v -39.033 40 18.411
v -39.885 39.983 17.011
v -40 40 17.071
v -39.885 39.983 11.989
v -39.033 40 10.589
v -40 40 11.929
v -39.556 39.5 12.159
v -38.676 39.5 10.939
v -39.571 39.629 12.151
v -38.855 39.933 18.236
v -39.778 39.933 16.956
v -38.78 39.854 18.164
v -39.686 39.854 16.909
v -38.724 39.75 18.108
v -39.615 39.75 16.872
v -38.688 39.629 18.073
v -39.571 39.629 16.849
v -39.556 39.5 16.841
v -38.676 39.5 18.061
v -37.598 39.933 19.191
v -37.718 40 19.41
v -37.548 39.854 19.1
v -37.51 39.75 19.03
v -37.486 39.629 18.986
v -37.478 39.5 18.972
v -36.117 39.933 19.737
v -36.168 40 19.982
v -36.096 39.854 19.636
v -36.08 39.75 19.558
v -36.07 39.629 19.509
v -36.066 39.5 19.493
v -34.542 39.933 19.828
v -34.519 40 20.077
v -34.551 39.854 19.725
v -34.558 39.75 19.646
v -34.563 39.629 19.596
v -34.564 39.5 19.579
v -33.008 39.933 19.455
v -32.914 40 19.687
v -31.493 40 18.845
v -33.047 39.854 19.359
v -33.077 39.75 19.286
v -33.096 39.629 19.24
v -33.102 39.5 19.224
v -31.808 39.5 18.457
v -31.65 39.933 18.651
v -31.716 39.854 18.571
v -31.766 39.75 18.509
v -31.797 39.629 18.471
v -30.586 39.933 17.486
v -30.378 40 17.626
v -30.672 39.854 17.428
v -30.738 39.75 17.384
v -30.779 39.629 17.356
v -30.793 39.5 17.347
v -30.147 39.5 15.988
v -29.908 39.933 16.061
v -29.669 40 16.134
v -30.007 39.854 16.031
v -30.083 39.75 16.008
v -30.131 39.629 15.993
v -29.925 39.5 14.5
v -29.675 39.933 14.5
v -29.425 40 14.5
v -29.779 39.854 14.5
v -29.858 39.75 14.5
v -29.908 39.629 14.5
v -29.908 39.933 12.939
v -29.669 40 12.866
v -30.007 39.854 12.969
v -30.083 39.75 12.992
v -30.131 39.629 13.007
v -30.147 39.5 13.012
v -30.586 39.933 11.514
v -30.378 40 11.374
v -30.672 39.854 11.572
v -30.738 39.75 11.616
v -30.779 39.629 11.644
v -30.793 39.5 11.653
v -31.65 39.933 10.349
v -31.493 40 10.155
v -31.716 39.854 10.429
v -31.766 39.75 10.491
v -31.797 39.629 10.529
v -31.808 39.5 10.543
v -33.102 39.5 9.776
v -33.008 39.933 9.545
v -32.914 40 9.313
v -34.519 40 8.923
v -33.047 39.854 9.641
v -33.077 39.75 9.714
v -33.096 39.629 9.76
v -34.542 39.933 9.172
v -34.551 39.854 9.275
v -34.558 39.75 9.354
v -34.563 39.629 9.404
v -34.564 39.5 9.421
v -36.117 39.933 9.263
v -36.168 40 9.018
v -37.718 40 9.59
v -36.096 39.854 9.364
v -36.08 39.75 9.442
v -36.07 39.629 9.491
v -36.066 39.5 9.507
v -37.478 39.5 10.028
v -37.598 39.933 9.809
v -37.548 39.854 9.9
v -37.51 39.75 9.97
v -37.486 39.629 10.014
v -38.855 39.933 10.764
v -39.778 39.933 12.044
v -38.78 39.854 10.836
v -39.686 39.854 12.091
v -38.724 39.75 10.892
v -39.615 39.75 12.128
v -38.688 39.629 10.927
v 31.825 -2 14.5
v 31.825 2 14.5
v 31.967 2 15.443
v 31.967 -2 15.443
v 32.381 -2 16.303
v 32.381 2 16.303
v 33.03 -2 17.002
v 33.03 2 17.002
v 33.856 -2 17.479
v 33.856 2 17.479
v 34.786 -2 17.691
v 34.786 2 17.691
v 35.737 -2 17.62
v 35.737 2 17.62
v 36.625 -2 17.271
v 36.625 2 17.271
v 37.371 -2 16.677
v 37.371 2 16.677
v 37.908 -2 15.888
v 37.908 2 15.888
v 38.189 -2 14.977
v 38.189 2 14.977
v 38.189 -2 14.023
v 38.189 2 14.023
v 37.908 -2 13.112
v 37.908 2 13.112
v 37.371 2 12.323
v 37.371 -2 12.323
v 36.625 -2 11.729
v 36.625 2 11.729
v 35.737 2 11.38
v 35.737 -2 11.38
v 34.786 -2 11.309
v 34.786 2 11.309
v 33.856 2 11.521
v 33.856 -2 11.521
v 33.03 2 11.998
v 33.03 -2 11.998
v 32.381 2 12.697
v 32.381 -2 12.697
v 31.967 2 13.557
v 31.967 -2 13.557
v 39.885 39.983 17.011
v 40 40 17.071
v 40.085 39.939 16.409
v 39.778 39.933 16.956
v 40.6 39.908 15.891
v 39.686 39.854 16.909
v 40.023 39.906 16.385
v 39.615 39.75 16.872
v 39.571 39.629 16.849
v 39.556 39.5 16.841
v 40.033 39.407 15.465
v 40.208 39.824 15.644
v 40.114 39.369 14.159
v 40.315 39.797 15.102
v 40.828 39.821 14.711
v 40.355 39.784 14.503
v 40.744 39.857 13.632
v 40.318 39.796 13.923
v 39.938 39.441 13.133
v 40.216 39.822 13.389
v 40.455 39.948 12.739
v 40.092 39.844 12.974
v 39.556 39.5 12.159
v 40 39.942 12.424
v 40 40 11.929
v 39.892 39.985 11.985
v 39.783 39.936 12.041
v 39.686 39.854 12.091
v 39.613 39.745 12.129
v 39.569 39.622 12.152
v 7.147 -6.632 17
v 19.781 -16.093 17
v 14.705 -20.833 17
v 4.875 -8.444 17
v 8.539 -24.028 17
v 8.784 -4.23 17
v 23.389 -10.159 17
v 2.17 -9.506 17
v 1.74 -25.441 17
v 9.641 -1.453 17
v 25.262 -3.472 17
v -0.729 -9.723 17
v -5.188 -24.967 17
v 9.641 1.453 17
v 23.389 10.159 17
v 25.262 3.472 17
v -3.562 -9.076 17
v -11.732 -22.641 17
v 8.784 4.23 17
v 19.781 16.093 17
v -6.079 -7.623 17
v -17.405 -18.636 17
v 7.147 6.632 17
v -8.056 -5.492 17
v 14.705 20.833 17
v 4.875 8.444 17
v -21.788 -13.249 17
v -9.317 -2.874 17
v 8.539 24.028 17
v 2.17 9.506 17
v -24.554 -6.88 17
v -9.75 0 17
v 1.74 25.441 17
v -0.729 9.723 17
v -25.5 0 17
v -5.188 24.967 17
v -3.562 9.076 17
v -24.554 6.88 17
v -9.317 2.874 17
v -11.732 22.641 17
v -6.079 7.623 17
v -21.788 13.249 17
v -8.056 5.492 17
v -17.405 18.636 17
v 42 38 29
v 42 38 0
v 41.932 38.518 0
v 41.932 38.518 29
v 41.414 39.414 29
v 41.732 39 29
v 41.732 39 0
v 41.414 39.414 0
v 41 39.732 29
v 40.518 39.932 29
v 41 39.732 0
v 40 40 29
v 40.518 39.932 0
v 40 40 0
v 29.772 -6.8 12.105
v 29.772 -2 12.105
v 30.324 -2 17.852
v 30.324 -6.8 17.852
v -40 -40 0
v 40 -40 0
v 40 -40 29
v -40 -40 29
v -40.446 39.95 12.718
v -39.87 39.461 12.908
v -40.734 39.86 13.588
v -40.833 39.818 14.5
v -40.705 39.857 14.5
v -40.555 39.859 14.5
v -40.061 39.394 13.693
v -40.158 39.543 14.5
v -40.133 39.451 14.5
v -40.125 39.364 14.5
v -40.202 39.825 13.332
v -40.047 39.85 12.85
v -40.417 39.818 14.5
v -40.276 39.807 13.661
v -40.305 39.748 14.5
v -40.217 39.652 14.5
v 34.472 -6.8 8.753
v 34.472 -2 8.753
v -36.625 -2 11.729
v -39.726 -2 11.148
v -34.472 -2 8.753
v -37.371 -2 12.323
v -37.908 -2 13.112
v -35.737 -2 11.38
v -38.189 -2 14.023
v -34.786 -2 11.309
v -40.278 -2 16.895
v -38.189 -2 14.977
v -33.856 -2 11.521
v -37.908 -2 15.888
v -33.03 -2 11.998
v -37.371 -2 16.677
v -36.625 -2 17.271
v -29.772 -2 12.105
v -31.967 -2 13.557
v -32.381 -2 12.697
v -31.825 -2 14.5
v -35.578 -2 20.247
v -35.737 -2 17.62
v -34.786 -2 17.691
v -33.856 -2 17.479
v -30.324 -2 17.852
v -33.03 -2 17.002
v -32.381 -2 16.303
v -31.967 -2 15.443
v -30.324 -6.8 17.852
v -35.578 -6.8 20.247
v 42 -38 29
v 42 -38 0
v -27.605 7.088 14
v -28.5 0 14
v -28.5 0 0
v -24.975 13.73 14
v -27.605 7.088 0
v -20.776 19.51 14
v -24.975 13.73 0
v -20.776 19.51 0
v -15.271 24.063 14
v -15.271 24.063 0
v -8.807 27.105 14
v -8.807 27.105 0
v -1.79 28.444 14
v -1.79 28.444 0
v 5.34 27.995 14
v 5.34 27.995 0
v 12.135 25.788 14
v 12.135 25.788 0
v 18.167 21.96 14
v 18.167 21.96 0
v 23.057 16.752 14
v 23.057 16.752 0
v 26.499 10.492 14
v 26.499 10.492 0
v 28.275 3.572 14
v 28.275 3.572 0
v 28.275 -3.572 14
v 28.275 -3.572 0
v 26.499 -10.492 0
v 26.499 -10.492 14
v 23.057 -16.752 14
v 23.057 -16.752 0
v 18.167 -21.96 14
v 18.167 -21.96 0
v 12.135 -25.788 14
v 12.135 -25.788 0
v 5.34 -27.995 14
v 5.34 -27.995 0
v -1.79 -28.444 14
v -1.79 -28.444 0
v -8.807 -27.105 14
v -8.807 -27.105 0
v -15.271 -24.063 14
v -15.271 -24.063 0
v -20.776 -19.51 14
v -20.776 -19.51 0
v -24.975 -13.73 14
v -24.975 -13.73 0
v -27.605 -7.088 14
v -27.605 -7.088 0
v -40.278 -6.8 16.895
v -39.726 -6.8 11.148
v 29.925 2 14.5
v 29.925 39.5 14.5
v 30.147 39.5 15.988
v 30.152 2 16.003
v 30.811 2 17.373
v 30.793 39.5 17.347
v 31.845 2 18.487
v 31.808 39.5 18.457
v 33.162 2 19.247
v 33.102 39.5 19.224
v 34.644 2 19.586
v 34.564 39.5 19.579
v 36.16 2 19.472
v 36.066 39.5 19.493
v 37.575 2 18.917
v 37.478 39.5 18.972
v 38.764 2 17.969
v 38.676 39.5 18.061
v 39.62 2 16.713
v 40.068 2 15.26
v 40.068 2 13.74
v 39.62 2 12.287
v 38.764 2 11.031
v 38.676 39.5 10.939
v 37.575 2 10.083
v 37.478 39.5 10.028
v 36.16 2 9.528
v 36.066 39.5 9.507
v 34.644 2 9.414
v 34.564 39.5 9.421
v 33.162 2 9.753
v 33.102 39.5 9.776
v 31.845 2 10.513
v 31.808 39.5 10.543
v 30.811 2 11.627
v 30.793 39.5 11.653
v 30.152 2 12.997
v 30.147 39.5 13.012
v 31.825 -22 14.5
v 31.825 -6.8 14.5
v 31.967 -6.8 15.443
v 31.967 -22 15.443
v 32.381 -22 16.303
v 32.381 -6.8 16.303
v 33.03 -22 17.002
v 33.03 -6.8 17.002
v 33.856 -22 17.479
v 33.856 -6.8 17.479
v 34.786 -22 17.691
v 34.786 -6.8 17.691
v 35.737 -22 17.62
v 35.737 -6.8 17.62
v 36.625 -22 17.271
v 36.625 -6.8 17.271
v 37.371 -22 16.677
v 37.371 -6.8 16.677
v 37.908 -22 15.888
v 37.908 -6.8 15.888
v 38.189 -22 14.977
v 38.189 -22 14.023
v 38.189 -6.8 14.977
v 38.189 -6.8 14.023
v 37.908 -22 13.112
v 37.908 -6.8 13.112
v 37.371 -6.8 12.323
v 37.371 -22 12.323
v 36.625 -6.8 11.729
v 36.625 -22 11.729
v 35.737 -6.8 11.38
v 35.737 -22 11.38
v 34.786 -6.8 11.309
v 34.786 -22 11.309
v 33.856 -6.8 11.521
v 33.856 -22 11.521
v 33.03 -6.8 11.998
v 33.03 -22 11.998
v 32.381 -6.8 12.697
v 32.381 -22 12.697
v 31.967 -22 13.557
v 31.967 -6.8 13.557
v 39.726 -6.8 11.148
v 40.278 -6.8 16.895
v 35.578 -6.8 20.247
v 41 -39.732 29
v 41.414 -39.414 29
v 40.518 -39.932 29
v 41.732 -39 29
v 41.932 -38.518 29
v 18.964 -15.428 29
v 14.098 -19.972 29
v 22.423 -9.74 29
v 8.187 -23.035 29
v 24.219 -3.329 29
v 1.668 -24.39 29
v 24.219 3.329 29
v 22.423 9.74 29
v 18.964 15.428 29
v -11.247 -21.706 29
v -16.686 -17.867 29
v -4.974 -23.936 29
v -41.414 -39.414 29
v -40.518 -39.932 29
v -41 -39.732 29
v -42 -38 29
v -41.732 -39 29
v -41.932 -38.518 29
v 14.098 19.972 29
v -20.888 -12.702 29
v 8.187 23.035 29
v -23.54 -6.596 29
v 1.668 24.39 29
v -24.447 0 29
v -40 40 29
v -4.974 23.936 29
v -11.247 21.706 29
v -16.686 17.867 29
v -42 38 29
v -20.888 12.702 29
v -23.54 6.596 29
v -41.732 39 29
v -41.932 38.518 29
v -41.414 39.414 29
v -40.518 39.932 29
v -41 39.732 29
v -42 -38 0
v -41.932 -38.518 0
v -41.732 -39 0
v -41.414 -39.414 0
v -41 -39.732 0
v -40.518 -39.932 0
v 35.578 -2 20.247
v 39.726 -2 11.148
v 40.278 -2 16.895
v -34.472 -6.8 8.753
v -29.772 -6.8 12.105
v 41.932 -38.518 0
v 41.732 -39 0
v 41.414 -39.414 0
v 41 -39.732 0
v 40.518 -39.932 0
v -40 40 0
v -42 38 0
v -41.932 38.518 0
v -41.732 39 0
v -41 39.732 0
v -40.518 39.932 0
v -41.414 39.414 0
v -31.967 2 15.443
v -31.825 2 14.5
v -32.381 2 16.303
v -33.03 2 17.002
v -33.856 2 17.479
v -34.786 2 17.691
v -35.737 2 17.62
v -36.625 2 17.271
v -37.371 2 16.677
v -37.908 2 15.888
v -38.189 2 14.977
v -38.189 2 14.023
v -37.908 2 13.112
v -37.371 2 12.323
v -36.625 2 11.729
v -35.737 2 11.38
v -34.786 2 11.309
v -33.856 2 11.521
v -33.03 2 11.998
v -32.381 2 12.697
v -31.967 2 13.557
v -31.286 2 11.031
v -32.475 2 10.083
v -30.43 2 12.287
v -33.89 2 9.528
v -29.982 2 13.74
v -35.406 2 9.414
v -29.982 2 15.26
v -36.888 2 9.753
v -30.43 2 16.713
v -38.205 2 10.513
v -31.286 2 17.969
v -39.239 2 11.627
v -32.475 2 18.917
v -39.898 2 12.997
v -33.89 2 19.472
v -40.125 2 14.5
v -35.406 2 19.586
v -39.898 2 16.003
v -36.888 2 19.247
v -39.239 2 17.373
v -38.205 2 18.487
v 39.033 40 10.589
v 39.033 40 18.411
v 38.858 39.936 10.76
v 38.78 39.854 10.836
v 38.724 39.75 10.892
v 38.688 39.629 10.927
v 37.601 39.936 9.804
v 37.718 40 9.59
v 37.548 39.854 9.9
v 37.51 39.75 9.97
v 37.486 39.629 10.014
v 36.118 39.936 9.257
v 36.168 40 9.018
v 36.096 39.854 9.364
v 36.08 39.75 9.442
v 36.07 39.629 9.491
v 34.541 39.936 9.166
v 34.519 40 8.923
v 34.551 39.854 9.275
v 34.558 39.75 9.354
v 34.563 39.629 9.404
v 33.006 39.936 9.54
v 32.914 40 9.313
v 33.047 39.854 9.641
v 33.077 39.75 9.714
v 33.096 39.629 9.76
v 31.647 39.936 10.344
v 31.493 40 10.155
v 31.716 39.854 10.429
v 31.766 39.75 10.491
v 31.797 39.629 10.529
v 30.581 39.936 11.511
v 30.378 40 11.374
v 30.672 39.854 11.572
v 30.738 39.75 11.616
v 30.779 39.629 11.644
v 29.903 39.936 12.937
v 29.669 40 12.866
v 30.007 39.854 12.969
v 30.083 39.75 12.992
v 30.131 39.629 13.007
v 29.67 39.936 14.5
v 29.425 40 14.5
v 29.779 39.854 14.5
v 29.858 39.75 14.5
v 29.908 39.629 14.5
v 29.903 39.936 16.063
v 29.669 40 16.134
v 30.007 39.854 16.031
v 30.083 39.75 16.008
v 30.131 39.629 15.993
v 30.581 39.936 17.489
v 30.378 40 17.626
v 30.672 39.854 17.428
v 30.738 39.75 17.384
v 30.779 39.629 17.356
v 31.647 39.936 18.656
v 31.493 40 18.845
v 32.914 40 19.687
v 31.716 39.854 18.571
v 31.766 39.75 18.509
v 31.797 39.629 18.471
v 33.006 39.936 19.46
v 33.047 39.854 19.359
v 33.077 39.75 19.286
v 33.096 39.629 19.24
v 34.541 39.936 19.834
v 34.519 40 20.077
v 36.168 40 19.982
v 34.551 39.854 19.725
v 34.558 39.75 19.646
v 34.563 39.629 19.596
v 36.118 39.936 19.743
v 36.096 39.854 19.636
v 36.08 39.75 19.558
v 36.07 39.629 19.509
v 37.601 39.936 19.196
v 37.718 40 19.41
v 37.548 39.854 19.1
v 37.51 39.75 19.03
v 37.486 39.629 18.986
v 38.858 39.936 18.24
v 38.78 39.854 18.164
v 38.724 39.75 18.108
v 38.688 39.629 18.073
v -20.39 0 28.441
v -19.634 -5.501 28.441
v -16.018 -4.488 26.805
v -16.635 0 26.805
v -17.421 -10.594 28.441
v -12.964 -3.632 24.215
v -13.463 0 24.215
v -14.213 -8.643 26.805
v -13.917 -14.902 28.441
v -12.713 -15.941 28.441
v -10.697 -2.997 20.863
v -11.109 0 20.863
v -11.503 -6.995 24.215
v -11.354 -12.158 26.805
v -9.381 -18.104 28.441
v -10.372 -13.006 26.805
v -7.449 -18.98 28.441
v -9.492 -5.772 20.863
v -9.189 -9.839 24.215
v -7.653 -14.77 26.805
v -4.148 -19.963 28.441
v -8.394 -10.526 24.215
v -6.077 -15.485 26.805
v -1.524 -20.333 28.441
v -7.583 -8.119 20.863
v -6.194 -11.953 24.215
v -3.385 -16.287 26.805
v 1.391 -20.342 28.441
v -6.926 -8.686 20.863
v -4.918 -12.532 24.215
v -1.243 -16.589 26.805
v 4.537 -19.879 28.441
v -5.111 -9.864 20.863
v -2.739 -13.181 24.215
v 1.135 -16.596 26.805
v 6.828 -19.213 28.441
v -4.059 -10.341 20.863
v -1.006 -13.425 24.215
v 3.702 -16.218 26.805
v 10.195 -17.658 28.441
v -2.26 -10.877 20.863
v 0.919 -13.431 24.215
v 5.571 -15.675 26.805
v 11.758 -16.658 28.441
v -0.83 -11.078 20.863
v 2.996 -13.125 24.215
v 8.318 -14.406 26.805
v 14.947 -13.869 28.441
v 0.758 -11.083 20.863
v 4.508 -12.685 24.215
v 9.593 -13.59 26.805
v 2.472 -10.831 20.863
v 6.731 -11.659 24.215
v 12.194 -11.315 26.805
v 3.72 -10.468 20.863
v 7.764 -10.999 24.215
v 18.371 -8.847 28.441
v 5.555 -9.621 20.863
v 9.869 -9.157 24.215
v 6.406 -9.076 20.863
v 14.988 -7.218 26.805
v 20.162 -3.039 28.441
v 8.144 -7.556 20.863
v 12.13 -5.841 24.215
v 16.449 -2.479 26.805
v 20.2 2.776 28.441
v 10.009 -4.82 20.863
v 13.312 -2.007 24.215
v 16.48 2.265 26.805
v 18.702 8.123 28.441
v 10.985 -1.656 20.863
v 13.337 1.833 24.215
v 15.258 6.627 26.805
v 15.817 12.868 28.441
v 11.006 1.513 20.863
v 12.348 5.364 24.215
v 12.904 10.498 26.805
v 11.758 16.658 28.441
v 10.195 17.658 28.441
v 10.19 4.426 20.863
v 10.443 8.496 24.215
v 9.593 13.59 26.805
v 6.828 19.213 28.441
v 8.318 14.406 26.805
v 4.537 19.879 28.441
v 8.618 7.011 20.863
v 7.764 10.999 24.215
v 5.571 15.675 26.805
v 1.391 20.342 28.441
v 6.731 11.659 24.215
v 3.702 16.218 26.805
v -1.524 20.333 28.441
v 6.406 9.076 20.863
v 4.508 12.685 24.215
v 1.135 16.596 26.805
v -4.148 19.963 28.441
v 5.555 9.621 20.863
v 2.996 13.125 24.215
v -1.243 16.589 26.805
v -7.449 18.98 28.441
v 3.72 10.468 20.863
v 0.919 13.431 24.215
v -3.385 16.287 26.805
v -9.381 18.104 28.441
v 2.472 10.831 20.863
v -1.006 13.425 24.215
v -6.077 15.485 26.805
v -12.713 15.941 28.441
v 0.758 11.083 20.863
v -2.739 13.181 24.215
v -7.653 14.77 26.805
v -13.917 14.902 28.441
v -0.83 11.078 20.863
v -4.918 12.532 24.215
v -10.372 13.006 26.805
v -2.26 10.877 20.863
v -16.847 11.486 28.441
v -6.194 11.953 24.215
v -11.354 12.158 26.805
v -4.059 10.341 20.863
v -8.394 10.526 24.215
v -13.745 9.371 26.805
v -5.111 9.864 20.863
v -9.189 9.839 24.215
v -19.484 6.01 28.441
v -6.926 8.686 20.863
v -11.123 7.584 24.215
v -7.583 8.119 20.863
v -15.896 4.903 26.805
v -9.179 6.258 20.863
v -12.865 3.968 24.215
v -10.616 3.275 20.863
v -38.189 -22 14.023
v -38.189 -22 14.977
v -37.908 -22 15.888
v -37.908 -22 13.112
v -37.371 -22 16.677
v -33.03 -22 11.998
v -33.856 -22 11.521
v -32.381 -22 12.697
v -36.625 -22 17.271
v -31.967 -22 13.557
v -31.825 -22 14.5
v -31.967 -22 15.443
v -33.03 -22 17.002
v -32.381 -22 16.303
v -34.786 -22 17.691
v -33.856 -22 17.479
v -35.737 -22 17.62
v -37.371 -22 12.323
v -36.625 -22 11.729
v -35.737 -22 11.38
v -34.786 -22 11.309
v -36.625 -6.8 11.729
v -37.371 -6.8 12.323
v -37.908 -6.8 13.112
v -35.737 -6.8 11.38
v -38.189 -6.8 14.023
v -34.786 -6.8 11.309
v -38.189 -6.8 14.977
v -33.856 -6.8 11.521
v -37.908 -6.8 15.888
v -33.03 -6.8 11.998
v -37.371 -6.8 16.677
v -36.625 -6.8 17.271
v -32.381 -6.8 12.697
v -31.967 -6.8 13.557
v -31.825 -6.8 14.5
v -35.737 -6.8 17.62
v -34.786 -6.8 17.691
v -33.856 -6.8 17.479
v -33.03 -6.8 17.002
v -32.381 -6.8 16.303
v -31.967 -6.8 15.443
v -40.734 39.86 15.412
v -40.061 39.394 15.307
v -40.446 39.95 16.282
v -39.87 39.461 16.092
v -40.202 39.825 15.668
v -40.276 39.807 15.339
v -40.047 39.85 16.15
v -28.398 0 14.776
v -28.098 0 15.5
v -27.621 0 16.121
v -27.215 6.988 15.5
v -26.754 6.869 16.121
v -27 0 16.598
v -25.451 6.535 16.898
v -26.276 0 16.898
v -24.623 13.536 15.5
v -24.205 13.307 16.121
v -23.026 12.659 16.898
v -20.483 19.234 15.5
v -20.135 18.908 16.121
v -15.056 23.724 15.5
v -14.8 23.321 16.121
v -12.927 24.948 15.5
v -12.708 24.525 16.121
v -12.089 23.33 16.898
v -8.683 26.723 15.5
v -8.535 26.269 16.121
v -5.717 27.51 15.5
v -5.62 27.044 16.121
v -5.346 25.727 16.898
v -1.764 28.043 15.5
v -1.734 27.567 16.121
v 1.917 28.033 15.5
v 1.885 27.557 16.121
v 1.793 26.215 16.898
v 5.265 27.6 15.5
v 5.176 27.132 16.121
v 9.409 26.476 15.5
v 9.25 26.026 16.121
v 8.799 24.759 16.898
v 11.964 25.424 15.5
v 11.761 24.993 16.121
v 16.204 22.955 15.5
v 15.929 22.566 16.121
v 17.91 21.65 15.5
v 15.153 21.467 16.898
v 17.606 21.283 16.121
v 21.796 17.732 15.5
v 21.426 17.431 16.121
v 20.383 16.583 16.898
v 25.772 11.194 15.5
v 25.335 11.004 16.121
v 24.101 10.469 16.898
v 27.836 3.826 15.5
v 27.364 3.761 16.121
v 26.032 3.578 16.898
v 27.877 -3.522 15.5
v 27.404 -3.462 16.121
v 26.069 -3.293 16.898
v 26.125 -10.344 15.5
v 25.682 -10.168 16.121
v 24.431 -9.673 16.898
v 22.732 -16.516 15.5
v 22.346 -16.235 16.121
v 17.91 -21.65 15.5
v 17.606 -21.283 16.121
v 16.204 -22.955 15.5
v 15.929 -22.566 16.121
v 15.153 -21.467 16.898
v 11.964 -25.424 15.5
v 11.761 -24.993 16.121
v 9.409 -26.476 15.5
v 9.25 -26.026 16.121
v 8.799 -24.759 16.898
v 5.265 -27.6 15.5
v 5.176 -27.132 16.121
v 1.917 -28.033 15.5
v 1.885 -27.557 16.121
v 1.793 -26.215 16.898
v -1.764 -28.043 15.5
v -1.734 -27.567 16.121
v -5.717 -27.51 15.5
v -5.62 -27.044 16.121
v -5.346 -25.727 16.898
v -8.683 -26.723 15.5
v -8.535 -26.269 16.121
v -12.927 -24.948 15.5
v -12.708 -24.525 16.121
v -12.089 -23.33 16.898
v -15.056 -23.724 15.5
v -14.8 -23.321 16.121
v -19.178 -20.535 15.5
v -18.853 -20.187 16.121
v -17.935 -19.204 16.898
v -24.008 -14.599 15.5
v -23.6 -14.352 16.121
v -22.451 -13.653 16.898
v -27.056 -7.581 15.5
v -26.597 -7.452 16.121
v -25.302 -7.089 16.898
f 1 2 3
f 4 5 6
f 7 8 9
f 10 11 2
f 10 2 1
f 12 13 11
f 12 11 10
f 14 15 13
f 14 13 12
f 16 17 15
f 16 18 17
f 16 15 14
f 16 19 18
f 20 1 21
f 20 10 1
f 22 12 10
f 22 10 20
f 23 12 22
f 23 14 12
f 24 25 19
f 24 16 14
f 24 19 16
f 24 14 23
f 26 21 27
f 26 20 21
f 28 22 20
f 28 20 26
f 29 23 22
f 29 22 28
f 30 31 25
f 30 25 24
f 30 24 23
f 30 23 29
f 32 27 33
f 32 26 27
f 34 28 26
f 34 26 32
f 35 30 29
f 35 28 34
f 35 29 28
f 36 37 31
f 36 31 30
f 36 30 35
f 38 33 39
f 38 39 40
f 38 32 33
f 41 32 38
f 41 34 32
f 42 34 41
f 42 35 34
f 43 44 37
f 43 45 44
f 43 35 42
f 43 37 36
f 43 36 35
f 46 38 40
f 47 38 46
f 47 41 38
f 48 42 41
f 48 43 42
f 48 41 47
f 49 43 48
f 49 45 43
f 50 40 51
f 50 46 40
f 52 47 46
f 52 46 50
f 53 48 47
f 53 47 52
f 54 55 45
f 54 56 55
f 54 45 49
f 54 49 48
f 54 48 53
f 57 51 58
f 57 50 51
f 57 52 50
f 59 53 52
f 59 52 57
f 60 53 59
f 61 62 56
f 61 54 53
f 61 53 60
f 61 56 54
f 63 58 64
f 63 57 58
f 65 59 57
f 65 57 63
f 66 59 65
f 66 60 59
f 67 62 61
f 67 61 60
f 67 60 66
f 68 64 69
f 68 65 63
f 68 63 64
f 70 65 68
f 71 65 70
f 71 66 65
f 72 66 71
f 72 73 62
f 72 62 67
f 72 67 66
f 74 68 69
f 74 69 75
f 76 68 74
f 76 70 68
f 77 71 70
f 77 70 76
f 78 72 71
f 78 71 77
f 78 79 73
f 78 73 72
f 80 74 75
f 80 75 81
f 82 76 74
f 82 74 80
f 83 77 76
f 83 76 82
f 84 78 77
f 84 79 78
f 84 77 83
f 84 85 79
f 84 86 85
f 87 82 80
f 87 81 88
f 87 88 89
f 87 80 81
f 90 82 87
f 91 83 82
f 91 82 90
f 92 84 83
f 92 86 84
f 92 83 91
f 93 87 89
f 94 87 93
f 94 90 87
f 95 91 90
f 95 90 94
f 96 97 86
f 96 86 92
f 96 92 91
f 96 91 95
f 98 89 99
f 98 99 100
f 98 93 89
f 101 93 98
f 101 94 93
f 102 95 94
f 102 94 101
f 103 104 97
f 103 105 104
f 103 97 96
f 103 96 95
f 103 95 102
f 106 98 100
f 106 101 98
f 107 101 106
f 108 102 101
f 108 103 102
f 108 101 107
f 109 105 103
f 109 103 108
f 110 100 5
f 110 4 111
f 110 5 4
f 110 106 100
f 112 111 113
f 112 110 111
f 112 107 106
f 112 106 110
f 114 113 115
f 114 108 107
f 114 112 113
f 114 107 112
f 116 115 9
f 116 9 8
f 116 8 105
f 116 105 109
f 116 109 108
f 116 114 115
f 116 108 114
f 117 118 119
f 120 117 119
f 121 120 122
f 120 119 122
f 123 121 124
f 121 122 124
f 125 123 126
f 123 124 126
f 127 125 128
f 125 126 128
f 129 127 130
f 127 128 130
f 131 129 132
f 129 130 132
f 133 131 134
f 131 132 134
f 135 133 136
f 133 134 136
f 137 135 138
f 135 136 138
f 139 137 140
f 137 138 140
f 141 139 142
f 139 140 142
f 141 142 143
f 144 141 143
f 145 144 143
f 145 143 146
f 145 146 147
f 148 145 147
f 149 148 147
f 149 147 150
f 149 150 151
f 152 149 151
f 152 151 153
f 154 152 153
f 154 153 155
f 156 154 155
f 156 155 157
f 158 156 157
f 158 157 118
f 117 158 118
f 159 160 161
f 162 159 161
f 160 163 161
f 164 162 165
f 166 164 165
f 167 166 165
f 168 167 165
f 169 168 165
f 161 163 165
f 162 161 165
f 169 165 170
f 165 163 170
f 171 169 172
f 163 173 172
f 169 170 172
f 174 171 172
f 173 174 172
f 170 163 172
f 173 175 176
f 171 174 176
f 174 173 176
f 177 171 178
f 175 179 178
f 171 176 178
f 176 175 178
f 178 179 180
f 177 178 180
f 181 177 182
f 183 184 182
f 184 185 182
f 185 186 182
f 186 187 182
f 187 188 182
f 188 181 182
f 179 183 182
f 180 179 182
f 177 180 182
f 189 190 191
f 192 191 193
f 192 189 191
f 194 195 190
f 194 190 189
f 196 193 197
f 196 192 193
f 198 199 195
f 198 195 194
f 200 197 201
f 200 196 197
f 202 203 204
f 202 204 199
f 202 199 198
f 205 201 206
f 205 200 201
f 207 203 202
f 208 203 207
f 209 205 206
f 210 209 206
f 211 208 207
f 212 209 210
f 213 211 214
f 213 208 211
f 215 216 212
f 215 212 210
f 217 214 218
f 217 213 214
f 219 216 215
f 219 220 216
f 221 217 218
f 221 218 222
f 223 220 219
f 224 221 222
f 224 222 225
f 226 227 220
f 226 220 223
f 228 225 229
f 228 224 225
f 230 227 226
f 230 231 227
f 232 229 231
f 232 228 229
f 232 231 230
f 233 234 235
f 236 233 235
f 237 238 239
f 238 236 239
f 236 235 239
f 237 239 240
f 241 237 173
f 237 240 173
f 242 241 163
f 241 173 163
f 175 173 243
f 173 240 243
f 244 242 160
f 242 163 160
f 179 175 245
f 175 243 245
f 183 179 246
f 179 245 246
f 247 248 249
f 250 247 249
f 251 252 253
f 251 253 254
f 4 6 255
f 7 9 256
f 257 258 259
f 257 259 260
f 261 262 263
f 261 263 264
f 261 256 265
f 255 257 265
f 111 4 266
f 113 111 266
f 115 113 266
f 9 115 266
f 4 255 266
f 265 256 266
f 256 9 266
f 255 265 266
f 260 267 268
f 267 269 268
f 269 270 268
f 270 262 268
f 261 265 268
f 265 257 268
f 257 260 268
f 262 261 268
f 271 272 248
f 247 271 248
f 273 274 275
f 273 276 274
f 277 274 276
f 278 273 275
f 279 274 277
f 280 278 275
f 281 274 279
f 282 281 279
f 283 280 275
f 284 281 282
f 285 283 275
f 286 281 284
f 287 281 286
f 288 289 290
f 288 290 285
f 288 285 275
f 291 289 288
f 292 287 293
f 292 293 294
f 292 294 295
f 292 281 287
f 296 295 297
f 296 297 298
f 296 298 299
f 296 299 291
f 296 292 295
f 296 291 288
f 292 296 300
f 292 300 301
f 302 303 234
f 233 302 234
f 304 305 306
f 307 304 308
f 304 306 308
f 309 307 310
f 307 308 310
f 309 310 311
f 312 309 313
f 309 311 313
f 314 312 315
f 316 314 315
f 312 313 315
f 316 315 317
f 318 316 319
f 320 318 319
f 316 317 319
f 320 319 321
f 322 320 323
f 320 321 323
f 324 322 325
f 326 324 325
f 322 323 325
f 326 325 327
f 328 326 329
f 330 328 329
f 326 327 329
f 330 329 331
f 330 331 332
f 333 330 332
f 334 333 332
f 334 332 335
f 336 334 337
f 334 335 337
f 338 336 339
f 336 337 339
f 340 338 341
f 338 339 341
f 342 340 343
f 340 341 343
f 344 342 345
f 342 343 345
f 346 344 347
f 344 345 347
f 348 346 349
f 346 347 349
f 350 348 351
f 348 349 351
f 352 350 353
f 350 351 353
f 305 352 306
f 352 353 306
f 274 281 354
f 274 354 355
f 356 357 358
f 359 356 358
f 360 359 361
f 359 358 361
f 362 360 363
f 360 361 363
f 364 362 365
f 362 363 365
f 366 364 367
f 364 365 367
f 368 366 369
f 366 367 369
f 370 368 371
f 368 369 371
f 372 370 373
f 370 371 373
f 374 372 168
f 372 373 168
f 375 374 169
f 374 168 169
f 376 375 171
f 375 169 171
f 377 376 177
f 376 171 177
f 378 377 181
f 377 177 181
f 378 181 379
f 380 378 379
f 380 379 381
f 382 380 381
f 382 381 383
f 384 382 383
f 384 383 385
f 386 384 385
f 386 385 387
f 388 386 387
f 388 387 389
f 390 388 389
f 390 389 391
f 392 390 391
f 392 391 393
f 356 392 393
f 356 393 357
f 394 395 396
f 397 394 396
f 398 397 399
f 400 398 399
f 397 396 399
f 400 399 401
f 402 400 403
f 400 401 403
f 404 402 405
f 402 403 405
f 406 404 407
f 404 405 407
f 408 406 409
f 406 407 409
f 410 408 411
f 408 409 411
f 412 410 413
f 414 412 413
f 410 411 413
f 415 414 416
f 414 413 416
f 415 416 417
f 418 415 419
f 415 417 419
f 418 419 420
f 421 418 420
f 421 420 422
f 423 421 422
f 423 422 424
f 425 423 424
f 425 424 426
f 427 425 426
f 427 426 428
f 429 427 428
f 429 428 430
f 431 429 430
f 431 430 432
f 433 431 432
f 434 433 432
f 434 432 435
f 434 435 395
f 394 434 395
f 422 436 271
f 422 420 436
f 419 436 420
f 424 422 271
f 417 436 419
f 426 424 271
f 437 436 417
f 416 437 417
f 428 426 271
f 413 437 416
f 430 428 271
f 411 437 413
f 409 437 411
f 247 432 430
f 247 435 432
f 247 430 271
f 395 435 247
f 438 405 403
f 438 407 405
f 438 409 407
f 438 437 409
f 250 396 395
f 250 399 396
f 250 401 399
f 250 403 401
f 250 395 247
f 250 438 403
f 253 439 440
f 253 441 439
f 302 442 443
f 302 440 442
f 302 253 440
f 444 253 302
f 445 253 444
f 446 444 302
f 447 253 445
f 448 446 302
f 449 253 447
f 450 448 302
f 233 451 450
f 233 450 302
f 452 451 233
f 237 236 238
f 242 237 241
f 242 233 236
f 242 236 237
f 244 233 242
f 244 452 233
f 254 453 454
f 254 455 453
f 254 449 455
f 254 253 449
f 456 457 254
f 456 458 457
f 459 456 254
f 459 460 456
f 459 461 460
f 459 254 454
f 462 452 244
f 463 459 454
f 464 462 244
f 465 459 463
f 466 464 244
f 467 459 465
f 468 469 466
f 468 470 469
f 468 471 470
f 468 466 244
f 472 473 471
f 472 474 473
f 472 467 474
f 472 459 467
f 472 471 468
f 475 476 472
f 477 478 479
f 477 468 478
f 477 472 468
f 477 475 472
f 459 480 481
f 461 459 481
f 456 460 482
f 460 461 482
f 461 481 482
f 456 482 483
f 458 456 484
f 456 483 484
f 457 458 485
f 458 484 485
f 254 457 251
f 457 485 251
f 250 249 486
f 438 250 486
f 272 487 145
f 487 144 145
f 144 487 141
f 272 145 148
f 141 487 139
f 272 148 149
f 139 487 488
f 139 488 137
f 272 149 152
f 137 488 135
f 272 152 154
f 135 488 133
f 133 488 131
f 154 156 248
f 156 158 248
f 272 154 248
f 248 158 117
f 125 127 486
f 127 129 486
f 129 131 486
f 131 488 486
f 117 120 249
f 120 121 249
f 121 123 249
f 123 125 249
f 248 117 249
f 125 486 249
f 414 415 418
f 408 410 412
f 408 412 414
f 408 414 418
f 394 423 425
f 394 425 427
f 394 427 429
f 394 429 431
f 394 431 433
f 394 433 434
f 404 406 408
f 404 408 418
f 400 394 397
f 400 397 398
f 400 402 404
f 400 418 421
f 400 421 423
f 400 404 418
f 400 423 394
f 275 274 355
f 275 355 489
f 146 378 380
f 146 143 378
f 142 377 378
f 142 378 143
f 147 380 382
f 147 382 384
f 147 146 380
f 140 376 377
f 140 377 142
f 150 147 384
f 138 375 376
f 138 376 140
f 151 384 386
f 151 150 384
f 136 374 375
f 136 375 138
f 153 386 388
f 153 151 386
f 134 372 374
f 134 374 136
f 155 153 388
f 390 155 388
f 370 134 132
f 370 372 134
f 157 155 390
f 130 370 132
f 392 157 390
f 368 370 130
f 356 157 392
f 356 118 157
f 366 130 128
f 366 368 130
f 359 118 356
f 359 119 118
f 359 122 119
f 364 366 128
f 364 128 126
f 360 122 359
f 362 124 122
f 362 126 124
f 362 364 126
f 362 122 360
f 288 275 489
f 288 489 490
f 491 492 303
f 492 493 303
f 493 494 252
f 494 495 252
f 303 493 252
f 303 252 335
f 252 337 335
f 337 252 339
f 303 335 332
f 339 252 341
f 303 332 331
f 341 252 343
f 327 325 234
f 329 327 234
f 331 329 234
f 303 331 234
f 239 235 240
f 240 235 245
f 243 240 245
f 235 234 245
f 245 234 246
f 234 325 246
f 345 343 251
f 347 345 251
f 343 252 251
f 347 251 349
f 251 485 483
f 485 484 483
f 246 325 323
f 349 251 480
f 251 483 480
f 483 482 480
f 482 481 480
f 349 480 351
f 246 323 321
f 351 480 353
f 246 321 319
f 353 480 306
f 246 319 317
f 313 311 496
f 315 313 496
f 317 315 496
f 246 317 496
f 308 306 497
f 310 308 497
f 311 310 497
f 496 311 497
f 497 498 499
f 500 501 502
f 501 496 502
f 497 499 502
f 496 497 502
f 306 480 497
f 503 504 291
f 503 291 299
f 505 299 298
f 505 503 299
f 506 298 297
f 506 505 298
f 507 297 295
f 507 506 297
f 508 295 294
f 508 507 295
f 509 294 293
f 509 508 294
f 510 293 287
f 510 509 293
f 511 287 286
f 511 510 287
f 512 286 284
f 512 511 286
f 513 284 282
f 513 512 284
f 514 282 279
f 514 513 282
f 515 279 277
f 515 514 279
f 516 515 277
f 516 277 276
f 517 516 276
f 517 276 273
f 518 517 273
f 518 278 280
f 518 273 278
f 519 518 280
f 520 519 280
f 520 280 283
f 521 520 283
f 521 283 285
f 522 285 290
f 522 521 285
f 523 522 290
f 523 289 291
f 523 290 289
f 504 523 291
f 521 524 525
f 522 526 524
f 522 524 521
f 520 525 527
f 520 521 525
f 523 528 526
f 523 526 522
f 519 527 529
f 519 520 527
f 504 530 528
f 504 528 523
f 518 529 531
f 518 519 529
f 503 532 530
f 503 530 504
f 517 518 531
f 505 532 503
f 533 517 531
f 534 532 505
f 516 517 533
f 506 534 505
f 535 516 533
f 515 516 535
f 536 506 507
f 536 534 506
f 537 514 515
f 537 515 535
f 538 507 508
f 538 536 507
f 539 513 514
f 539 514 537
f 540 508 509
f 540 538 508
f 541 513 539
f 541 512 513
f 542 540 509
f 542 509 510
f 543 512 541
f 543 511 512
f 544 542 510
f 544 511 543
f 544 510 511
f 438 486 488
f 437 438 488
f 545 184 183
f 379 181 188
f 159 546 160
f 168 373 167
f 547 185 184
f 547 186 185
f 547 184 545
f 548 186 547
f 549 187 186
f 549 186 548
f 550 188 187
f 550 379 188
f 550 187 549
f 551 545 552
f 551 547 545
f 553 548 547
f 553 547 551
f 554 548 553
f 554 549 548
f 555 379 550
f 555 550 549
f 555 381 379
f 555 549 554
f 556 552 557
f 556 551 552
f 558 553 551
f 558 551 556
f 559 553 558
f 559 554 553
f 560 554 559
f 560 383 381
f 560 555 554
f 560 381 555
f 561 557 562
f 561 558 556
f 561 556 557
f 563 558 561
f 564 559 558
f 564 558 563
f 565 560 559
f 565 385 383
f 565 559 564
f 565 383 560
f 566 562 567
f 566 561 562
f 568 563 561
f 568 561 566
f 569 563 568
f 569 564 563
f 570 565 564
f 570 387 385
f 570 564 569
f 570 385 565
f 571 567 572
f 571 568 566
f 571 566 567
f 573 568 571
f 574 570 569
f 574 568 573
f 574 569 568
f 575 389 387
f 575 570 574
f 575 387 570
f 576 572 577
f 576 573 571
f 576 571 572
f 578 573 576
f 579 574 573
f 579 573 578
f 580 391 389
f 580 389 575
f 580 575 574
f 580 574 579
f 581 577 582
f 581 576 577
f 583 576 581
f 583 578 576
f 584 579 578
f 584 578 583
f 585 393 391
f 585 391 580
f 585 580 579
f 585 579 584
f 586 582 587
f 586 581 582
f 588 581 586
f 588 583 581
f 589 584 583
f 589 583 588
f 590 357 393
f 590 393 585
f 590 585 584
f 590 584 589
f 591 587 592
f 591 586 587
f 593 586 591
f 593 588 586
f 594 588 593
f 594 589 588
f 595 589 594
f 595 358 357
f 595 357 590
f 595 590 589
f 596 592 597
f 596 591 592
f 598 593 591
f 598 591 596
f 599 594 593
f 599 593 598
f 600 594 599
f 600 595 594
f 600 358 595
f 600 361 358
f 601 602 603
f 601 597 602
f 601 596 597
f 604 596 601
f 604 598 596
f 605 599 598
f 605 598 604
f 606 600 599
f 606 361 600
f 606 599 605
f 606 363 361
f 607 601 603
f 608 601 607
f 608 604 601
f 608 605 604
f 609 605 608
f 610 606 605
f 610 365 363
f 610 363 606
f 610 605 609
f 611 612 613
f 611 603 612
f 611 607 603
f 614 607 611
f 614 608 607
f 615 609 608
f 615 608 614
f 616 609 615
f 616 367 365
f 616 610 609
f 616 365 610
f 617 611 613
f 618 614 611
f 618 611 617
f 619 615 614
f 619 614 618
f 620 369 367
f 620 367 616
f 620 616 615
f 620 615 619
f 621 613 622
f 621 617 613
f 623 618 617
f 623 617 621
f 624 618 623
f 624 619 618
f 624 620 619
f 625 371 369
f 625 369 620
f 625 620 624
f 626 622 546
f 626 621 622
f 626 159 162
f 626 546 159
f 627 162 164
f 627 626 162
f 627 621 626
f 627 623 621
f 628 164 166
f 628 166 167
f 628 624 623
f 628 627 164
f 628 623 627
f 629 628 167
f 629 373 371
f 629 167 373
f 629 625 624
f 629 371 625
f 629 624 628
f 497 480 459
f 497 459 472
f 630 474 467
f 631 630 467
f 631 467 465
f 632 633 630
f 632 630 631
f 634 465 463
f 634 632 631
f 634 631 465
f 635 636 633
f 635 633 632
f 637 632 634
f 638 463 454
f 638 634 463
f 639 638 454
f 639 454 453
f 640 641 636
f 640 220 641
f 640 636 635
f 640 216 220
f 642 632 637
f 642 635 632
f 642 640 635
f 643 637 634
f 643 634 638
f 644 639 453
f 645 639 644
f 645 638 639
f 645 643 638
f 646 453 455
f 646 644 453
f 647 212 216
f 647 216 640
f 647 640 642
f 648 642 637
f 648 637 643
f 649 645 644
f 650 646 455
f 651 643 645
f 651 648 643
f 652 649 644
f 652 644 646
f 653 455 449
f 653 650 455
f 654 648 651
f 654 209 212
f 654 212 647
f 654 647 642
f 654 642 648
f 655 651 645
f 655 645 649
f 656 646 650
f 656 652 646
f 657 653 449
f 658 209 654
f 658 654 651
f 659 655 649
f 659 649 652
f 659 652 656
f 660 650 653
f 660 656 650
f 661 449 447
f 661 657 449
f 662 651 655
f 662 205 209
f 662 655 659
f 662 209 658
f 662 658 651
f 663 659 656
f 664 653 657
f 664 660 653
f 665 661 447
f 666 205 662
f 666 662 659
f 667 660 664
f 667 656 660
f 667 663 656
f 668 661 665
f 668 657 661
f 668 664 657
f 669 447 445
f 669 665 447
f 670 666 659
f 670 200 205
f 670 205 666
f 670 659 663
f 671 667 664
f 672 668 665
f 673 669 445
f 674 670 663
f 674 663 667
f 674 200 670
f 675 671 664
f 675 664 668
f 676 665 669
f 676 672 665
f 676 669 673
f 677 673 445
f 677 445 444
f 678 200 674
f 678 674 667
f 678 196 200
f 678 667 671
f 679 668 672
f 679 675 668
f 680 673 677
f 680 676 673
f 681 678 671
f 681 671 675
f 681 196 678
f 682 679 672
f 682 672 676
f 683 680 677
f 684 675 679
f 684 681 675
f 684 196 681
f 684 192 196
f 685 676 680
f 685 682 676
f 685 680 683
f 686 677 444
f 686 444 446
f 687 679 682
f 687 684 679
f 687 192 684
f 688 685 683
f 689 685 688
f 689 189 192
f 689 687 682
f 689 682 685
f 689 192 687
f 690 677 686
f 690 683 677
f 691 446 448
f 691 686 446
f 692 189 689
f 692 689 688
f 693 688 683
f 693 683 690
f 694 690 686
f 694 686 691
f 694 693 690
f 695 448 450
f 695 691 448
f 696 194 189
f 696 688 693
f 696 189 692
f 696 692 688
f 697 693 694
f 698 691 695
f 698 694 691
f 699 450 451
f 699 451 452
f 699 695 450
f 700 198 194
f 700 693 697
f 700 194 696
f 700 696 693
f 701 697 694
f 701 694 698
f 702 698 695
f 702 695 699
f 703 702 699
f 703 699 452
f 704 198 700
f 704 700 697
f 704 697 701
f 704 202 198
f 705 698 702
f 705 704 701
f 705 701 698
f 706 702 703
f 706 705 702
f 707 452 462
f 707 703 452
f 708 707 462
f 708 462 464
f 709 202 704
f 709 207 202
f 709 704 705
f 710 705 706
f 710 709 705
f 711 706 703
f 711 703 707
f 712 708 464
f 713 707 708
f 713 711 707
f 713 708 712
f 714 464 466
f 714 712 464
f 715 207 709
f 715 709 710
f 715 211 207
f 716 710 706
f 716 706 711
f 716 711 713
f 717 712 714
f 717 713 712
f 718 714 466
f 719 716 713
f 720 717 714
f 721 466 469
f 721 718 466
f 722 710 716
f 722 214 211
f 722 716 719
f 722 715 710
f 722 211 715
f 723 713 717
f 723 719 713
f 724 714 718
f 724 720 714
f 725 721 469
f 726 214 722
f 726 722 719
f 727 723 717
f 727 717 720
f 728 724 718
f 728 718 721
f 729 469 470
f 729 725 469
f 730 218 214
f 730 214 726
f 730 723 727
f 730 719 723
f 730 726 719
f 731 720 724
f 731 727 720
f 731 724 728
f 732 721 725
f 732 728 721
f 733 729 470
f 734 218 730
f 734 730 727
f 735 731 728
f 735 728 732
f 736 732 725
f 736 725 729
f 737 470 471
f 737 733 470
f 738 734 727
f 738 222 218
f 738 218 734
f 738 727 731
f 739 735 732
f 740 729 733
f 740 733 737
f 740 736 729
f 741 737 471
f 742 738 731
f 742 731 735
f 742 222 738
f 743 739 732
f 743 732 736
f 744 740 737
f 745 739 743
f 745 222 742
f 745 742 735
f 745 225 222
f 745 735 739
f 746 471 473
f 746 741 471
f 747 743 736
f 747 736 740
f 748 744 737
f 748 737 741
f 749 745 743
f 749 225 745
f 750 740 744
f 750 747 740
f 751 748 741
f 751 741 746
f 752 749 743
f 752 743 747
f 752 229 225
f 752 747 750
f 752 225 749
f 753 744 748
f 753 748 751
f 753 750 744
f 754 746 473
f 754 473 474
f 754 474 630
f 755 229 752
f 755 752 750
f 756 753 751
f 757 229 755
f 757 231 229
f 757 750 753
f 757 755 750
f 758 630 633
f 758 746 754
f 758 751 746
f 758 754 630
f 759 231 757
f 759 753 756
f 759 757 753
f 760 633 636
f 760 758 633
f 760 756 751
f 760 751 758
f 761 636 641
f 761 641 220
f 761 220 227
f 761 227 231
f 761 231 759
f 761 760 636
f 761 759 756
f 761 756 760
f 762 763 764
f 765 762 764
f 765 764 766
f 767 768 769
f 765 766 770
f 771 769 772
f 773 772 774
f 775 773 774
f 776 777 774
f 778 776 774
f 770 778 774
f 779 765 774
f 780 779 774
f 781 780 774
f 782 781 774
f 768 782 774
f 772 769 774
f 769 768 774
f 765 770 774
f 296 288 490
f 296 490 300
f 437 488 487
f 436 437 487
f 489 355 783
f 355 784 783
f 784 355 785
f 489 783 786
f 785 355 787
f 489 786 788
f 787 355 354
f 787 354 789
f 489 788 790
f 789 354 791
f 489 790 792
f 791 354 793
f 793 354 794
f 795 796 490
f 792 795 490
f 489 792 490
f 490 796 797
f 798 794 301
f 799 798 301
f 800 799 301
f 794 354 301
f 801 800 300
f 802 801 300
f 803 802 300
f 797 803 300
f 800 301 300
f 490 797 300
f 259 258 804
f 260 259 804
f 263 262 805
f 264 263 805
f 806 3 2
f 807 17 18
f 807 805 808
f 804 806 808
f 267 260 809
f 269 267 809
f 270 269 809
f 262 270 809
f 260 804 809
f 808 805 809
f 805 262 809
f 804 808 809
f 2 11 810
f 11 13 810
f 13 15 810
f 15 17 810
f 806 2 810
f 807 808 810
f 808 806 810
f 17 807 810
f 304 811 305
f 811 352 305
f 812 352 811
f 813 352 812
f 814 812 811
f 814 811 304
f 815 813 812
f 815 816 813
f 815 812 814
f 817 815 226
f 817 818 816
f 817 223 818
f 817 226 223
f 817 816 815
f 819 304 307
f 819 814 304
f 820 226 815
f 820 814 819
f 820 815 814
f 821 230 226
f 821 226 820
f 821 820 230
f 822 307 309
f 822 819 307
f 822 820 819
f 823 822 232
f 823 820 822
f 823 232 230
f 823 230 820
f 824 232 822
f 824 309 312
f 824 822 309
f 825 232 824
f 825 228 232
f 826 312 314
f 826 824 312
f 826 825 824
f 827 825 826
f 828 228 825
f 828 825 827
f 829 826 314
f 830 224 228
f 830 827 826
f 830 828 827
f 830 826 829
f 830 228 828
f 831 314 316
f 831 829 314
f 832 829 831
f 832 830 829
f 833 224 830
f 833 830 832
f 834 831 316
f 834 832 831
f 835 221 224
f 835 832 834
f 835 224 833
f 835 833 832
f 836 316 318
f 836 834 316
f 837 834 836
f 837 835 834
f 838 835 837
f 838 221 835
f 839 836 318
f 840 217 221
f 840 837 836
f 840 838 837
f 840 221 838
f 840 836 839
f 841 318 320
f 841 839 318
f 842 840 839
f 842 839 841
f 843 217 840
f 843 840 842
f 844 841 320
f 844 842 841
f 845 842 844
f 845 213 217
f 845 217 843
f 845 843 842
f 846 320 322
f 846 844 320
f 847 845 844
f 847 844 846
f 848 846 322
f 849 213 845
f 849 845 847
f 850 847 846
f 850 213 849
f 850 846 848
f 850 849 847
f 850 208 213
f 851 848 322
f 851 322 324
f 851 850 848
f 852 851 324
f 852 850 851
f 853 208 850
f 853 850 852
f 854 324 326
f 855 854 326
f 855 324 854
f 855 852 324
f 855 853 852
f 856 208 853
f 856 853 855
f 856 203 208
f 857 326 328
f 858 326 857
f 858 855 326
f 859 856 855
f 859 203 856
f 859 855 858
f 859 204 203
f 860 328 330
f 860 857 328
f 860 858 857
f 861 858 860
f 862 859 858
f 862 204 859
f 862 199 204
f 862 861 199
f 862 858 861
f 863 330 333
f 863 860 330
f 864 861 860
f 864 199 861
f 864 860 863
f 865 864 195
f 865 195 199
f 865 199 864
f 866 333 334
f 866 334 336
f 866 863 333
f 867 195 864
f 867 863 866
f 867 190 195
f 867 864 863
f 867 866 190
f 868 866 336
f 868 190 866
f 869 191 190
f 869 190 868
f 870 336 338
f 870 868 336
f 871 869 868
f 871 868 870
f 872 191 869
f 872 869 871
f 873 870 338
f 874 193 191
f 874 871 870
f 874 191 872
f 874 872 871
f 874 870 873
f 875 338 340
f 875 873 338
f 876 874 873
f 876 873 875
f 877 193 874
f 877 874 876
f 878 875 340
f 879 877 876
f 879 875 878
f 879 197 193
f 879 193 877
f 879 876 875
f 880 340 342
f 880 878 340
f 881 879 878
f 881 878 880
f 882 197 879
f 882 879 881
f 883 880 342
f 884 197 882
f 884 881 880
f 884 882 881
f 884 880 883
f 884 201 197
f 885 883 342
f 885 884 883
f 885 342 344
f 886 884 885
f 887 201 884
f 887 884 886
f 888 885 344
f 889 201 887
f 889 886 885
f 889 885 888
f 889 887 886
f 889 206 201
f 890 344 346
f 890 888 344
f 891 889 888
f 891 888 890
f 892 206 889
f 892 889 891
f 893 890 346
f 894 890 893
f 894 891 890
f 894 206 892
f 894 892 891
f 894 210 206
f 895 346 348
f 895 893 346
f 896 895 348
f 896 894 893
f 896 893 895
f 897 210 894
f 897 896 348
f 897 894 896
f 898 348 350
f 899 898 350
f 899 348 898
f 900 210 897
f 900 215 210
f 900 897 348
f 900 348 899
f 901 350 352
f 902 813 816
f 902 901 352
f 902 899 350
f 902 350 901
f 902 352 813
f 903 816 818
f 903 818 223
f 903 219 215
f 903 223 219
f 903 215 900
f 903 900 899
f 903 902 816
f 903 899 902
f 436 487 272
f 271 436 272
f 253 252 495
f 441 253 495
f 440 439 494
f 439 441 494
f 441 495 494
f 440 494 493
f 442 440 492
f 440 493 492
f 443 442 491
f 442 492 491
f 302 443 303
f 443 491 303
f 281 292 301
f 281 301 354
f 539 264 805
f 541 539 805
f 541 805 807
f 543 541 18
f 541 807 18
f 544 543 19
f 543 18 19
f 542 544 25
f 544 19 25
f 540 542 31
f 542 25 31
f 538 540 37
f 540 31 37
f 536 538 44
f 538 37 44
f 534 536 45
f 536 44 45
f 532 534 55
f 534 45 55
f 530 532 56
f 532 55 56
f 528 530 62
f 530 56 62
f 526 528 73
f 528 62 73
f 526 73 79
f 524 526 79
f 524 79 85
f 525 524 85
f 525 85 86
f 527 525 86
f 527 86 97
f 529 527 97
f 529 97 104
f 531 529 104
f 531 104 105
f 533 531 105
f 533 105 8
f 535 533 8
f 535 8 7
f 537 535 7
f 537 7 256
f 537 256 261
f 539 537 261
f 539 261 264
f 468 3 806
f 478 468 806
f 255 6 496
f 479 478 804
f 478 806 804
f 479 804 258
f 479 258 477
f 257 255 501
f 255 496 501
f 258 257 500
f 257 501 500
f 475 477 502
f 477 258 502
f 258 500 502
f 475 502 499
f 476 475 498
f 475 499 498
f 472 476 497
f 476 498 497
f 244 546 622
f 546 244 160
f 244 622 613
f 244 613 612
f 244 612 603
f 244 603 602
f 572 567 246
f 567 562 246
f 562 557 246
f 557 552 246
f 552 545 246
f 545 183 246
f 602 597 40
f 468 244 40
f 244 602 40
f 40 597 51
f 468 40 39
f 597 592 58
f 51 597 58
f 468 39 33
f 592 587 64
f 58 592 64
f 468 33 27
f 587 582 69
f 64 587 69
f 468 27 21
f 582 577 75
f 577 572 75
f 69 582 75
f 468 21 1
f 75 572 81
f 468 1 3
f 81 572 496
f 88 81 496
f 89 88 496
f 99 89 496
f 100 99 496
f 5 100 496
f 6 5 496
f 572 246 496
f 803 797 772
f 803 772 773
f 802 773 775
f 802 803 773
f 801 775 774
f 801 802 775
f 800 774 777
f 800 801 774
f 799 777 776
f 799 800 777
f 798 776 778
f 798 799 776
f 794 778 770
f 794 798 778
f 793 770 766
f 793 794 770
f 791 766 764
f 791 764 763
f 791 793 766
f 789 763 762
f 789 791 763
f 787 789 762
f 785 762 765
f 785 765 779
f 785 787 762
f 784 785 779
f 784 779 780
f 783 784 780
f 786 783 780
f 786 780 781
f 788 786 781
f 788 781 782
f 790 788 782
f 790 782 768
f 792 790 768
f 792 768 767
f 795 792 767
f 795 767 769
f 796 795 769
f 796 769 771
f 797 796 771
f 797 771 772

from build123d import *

# Parameters (mm, degrees)
SKETCH1_W          = 80
SKETCH1_H          = 84
SKETCH1_R          = 9.75
MAIN_BOSS_DEPTH    = 29
SKETCH2_R          = 28.5
CUT_EXTRUDE1_DEPTH = 17
FILLET1_R          = 15
SKETCH3_R          = 5.1
SCREW_HEAD_DEPTH   = 38
NUT_START          = -42
NUT_SLOT_DEPTH     = 4.8
SKETCH5_R          = 3.2
THROUGH_HOLE_DEPTH = 62
FILLET2_R          = 3
FILLET3_R          = 2
FILLET4_R          = 0.5


with BuildPart() as part:
    # Sketch1 → Main Boss (new body)
    with BuildSketch(Plane(origin=(0, 0, 0), x_dir=(0, 1, 0), z_dir=(0, 0, 1))):
        Rectangle(SKETCH1_W, SKETCH1_H)
        with Locations(Location((0, 0, 0), (0, 0, 90))):
            Circle(SKETCH1_R, mode=Mode.SUBTRACT)
    extrude(amount=MAIN_BOSS_DEPTH)

    # Sketch2 → Cut-Extrude1 (cut)
    with BuildSketch(Plane(origin=(0, 0, 0), x_dir=(1, 0, 0), z_dir=(0, 0, -1))):
        with Locations(Location((0, 0, 0), (0, 0, 180))):
            Circle(SKETCH2_R)
    extrude(amount=-CUT_EXTRUDE1_DEPTH, mode=Mode.SUBTRACT)

    # Fillet1
    # the kernel refuses this fillet: 15 mm, written as the material it takes off along each edge
    with BuildSketch(Plane(origin=(0, 0, 29), x_dir=(-1, 0, 0), z_dir=(0, 1, 0))) as fillet1_piece_1:
        with BuildLine():
            CenterArc((24.446938457, -15), FILLET1_R, 90, 78.463040967)
            Line((9.75, -12), (9.456061231, -11.94))
            ThreePointArc((9.456061231, -11.94), (9.45, -6), (9.45, 0))
            Line((9.45, 0), (9.75, 0.3))
            Line((9.75, 0.3), (24.446938457, 0.3))
            Line((24.446938457, 0.3), (24.446938457, 0))
        make_face()
    revolve(axis=Axis((0, 0, 29), (0, 0, 1)), mode=Mode.SUBTRACT)

    # Sketch3 → Screw Head (cut)
    with BuildSketch(Plane(origin=(0, 40, 0), x_dir=(-1, 0, 0), z_dir=(0, 1, 0))):
        with Locations((-35.025, 14.5)):
            Circle(SKETCH3_R)
        with Locations((35.025, 14.5)):
            Circle(SKETCH3_R)
    extrude(amount=-SCREW_HEAD_DEPTH, mode=Mode.SUBTRACT)

    # Sketch4 → Nut Slot (cut)
    with BuildSketch(Plane(origin=(0, 40, 0), x_dir=(-1, 0, 0), z_dir=(0, 1, 0)).offset(NUT_START)):
        Polygon((-30.324429276, 17.852307892), (-35.577898433, 20.246967605), (-40.278469158, 16.894659714), (-39.725570724, 11.147692108), (-34.472101567, 8.753032395), (-29.771530842, 12.105340286), align=None)
    nut_slot = extrude(amount=-NUT_SLOT_DEPTH, mode=Mode.SUBTRACT)

    # Sketch5 → Through Hole (cut)
    with BuildSketch(Plane(origin=(0, 40, 0), x_dir=(-1, 0, 0), z_dir=(0, 1, 0))):
        with Locations((-35.025, 14.5)):
            Circle(SKETCH5_R)
    through_hole = extrude(amount=-THROUGH_HOLE_DEPTH, mode=Mode.SUBTRACT)

    # Mirror2: Nut Slot, Through Hole across plane
    add(nut_slot.mirror(Plane(origin=(0, 0, 0), x_dir=(0, 0, 1), z_dir=(1, 0, 0))), mode=Mode.SUBTRACT)
    add(through_hole.mirror(Plane(origin=(0, 0, 0), x_dir=(0, 0, 1), z_dir=(1, 0, 0))), mode=Mode.SUBTRACT)

    # Fillet2
    fillet2_edges = [part.edges().sort_by_distance(p)[0] for p in [
        (28.5, 0, 17),
    ]]
    fillet(fillet2_edges, radius=FILLET2_R)

    # Fillet3
    # the kernel refuses this fillet: 2 mm, written as the material it takes off along each edge
    with BuildSketch(Plane(origin=(42, 40, -5), x_dir=(0, -1, 0), z_dir=(0, 0, 1)), Plane(origin=(-42, 40, -5), x_dir=(1, 0, 0), z_dir=(0, 0, 1))) as fillet3_piece_1:
        with BuildLine():
            CenterArc((FILLET3_R, -FILLET3_R), FILLET3_R, 90, 90)
            Line((0, -FILLET3_R), (0, 0))
            Line((0, 0), (FILLET3_R, 0))
        make_face()
    extrude(amount=39, mode=Mode.SUBTRACT)
    with BuildSketch(Plane(origin=(42, -40, -5), x_dir=(0, 1, 0), z_dir=(0, 0, 1)), Plane(origin=(-42, -40, -5), x_dir=(1, 0, 0), z_dir=(0, 0, 1))) as fillet3_piece_2:
        with BuildLine():
            CenterArc((FILLET3_R, FILLET3_R), FILLET3_R, 180, 90)
            Line((0, FILLET3_R), (0, 0))
            Line((0, 0), (FILLET3_R, 0))
        make_face()
    extrude(amount=39, mode=Mode.SUBTRACT)

    # Fillet4
    fillet4_edges = [part.edges().sort_by_distance(p)[0] for p in [
        (34.46042051, 40, 19.568653667),
        (-40.093653599, 39.997806015, 15.064580313),
        (40.125, 39.996089928, 14.5),
        (-29.925, 40, 14.5),
    ]]
    fillet(fillet4_edges, radius=FILLET4_R)


solid = part.part
